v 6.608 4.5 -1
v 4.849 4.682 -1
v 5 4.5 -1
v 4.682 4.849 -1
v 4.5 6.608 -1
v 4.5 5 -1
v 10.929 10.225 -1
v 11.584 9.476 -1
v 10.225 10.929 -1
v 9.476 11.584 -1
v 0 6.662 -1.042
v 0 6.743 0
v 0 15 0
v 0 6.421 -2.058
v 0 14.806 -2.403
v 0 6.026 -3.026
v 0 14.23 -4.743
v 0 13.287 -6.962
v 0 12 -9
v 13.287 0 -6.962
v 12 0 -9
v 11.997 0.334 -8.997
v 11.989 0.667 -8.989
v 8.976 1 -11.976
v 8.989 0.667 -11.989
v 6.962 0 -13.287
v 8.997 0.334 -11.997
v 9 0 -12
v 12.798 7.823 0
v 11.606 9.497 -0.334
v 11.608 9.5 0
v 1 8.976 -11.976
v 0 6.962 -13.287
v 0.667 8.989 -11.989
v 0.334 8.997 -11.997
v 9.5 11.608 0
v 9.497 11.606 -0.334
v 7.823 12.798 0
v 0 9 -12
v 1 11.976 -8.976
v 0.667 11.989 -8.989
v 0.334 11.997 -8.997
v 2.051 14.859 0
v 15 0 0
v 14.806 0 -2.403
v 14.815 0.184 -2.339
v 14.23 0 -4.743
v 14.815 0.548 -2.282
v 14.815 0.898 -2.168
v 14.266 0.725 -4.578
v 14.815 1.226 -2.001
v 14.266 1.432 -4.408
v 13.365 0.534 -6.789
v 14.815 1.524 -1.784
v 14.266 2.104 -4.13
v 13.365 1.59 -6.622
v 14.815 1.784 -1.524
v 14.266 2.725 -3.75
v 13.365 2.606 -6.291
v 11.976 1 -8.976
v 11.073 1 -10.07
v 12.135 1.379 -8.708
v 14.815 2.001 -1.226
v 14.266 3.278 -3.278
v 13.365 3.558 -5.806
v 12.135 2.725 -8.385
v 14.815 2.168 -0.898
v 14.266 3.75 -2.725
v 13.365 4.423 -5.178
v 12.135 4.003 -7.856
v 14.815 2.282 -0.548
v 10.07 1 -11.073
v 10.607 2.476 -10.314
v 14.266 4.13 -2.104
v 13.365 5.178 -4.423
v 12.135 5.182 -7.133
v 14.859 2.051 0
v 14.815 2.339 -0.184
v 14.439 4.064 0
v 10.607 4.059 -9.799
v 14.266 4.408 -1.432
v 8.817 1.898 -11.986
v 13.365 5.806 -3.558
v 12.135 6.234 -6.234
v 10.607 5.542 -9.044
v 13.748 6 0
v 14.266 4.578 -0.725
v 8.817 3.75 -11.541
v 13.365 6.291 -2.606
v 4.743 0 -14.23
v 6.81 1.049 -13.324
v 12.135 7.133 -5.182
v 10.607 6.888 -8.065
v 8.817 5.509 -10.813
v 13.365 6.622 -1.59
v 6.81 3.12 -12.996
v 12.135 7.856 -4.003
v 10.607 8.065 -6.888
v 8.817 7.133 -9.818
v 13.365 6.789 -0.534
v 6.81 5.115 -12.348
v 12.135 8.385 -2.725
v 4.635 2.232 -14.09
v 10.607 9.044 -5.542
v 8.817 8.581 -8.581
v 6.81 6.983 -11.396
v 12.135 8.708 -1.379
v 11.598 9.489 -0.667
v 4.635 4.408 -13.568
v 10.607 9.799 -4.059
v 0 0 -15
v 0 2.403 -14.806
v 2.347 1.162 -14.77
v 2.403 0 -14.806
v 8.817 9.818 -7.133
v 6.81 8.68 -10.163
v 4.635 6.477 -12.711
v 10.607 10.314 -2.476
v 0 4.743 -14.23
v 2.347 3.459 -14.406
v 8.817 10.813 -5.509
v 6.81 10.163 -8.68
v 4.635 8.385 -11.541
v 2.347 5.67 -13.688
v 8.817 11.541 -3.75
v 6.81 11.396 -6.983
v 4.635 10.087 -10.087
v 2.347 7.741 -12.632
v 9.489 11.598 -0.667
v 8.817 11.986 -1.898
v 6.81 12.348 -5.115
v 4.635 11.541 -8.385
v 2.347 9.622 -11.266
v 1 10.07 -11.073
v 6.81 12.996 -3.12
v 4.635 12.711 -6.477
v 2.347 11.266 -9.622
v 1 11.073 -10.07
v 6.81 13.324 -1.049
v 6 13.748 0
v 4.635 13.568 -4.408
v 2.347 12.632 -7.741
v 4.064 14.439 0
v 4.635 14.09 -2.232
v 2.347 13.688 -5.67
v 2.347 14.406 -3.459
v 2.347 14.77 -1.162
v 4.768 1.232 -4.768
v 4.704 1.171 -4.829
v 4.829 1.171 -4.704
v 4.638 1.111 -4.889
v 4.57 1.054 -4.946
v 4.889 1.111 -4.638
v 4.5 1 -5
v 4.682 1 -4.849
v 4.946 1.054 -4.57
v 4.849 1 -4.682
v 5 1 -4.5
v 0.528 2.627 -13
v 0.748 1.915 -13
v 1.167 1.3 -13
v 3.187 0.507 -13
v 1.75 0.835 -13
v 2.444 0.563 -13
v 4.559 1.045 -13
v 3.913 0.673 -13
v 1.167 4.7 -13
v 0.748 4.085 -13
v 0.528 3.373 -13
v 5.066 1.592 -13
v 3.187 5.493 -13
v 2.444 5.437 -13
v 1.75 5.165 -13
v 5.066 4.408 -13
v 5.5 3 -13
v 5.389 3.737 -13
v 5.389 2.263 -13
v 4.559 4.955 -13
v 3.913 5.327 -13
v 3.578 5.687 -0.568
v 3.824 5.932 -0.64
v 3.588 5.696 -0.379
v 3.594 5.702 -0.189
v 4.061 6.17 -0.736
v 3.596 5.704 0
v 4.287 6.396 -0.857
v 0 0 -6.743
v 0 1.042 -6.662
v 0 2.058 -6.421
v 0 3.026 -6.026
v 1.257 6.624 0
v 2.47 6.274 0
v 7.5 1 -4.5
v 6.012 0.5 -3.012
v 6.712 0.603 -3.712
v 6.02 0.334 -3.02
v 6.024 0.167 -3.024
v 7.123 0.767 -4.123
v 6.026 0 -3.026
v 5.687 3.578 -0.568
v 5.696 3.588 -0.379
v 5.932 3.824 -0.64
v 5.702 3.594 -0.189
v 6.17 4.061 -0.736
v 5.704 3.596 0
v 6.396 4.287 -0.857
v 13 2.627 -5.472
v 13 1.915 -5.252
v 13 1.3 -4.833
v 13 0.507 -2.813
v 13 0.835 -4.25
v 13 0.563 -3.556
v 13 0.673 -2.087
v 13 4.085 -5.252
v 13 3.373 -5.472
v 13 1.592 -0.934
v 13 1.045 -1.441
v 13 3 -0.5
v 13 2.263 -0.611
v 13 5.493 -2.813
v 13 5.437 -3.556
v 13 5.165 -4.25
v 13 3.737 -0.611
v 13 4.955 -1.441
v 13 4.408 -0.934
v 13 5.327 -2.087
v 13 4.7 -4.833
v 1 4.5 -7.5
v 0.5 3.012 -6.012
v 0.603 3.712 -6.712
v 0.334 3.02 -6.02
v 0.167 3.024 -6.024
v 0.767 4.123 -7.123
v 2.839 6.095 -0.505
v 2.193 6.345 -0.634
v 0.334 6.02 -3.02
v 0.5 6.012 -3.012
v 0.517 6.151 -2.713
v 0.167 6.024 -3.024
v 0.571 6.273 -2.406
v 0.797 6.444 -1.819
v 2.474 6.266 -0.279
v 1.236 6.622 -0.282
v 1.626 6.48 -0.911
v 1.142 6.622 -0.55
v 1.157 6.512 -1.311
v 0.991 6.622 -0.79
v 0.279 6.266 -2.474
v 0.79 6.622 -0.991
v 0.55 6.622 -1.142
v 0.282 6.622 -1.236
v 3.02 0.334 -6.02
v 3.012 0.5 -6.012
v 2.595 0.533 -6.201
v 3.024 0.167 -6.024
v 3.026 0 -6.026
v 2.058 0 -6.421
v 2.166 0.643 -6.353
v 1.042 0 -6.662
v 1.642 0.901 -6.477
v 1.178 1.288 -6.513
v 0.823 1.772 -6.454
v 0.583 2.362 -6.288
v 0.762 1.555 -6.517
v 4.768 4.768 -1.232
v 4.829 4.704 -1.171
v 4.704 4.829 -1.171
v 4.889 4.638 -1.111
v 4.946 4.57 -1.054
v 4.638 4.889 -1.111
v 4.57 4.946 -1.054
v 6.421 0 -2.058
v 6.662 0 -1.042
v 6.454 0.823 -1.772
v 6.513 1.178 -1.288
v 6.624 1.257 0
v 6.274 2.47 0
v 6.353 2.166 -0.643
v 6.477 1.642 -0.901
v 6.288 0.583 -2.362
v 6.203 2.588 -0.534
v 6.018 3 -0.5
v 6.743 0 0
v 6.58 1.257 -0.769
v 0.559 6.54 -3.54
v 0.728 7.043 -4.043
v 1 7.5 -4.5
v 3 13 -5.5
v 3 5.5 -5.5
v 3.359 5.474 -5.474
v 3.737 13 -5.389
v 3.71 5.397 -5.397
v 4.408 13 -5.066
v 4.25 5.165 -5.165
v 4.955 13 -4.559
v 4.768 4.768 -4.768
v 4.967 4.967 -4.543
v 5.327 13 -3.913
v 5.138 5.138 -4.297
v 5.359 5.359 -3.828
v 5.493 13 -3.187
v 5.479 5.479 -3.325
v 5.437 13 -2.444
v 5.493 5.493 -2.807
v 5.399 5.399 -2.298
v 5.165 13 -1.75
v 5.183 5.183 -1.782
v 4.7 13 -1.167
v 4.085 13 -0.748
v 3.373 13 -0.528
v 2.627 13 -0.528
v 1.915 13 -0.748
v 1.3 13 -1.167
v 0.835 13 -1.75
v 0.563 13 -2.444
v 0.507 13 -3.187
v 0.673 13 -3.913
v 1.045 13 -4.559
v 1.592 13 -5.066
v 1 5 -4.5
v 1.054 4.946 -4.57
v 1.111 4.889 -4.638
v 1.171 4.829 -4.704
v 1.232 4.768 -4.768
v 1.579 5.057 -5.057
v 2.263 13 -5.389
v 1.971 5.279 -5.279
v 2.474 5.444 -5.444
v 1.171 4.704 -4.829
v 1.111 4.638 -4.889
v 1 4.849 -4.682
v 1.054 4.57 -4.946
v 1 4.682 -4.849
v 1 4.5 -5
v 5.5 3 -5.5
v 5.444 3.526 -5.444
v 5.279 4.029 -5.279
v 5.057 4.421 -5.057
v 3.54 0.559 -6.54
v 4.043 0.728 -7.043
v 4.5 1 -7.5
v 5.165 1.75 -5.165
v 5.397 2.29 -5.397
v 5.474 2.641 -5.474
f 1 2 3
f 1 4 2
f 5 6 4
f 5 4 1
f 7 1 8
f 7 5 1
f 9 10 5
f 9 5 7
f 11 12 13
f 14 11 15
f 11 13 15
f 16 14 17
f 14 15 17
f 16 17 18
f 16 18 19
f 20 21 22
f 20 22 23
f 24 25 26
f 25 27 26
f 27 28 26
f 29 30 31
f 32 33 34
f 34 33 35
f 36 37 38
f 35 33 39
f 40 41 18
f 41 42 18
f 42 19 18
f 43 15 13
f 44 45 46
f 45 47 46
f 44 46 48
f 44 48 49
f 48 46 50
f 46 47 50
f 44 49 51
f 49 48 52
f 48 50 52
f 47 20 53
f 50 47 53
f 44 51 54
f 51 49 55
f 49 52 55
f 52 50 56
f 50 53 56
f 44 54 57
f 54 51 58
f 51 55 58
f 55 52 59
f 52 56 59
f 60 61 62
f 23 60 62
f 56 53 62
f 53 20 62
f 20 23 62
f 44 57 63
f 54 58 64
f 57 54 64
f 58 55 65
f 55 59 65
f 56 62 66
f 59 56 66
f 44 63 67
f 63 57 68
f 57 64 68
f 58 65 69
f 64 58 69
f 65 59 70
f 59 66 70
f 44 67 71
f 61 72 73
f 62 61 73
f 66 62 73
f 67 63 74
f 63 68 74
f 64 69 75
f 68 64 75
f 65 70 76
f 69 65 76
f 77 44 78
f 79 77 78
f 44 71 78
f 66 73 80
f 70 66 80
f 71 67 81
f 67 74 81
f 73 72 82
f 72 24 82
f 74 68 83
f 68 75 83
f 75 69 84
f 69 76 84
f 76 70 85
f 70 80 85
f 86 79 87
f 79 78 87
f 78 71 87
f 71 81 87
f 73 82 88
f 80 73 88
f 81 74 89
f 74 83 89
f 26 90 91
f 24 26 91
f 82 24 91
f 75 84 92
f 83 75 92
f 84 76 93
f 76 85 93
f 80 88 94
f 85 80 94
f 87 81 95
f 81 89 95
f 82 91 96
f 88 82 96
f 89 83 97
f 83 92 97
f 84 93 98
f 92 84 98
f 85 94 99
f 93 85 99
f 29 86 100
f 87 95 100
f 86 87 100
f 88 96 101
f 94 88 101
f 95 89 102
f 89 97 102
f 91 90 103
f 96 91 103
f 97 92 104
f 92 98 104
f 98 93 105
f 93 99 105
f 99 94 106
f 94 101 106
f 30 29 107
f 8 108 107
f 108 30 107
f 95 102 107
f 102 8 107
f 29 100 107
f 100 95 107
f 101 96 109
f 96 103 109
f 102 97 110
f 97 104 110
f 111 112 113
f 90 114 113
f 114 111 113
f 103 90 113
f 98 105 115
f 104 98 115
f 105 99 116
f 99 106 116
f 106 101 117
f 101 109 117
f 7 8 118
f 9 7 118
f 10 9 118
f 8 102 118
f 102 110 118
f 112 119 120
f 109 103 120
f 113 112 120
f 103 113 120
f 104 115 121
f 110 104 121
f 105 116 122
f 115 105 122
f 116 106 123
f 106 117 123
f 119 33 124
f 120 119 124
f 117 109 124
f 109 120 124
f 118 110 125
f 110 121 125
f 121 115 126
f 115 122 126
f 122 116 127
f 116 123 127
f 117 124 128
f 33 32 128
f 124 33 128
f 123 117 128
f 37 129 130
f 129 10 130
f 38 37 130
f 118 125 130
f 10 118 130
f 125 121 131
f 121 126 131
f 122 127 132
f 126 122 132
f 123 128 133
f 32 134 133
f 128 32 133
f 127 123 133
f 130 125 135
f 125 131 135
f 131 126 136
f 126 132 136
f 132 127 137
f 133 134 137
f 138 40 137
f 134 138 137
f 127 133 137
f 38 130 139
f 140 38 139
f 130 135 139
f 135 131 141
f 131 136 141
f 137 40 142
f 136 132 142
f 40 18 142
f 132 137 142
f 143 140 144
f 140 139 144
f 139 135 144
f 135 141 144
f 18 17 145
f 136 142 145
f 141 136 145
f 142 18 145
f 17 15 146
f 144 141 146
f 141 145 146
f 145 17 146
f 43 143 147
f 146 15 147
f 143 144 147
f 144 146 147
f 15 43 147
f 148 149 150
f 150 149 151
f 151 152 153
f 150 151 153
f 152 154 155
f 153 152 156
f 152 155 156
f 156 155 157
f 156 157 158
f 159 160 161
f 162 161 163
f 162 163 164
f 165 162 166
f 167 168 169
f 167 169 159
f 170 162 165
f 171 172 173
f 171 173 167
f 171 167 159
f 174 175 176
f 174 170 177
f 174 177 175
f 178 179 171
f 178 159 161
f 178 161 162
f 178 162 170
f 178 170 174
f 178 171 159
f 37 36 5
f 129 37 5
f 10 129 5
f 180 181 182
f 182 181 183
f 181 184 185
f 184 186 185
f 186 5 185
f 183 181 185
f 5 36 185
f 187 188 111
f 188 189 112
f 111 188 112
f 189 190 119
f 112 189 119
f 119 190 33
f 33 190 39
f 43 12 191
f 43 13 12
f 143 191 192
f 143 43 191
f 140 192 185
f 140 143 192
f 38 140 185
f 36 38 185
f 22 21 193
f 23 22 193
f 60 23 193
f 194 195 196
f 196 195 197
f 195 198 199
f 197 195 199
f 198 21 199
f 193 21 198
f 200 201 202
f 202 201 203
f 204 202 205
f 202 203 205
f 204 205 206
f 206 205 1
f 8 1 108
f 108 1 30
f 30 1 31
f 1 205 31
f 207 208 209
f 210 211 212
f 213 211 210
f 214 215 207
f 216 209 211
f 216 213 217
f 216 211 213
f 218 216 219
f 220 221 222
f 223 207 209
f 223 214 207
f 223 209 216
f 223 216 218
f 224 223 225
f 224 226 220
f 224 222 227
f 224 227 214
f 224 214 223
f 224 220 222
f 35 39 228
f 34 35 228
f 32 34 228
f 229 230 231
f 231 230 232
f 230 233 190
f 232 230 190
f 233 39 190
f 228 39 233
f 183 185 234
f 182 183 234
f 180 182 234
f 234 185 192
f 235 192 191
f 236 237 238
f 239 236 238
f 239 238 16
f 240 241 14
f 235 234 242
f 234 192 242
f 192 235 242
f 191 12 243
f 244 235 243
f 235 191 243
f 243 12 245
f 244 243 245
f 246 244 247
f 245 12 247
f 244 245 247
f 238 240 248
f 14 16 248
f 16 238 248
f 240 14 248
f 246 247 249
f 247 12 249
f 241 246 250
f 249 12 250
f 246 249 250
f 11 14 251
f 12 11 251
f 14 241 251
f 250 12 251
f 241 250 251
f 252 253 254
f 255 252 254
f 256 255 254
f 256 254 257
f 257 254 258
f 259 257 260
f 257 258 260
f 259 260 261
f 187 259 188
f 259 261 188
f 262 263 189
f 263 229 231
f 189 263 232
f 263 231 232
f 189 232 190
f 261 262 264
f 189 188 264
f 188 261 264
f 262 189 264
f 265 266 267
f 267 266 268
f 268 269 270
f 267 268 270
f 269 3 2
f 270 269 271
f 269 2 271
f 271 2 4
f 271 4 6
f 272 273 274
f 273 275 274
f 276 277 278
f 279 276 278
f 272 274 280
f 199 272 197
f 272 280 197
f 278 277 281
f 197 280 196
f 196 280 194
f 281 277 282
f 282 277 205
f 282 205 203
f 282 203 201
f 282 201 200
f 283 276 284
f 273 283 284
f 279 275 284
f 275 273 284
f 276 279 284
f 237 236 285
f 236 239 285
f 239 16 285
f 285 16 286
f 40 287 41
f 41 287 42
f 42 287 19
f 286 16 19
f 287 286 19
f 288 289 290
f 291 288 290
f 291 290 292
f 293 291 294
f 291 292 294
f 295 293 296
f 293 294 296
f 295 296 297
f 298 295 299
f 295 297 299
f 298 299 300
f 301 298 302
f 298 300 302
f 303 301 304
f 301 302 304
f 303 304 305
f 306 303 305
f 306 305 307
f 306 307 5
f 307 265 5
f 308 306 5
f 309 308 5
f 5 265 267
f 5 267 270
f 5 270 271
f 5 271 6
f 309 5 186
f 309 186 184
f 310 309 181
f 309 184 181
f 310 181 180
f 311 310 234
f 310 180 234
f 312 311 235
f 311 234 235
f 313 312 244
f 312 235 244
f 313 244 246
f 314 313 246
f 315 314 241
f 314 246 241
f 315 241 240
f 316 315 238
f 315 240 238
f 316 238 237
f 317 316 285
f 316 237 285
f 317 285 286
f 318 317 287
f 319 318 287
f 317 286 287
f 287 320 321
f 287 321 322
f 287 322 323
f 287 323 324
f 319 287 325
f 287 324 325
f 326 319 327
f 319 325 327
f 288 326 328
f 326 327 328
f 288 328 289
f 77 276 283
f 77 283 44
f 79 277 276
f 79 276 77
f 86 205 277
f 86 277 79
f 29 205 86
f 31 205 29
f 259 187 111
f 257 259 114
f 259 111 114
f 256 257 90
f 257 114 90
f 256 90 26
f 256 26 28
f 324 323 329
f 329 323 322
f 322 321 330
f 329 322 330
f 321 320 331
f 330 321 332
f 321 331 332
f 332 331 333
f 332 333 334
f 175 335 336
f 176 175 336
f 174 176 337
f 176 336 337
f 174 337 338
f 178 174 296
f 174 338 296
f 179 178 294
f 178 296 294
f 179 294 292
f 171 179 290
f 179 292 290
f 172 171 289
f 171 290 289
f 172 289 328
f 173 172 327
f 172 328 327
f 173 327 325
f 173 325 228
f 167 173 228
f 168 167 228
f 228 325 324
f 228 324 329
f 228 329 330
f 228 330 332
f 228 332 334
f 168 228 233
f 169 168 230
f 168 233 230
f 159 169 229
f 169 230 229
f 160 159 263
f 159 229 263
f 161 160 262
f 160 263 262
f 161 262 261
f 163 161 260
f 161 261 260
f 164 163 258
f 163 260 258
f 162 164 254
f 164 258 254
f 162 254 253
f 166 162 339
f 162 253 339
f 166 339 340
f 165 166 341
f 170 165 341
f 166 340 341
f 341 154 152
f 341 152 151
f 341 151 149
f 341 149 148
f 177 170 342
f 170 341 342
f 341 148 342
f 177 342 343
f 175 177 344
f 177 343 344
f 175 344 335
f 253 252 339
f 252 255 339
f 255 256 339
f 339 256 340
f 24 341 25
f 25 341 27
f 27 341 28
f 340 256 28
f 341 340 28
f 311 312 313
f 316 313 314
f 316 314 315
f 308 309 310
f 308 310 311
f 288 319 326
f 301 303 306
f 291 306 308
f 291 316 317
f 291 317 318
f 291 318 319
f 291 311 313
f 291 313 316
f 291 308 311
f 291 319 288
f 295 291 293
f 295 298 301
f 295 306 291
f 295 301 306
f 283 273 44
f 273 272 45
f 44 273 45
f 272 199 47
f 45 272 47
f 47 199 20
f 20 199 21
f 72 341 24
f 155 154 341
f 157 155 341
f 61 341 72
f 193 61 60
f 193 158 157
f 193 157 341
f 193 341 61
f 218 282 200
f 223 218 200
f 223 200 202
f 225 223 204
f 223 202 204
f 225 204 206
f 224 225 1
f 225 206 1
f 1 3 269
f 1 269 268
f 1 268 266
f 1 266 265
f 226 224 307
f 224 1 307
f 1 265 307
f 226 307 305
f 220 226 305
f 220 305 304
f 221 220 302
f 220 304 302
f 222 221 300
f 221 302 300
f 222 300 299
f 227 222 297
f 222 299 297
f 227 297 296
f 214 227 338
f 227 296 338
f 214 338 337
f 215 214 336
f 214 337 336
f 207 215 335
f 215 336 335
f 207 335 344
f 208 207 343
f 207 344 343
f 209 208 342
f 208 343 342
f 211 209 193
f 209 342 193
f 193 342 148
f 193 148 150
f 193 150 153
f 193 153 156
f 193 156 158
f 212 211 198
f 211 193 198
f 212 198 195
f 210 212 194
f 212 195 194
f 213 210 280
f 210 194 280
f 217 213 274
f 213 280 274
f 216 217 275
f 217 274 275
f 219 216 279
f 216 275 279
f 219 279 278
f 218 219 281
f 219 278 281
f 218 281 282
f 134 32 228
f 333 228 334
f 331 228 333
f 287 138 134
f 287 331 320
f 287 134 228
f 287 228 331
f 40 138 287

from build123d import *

# Parameters (mm, degrees)
REVOLVE1_ANGLE      = 90.0000000000002
SKETCH5_R           = 2.5000000000000013
CUT_EXTRUDE3_DEPTH  = 13.000000000000002
SKETCH6_R           = 2.5000000000000004
CUT_EXTRUDE4_DEPTH  = 13.000000000000002
SKETCH7_R           = 2.5000000000000013
CUT_EXTRUDE5_DEPTH  = 13.000000000000002
CUT_REVOLVE14_ANGLE = 90.0000000000002
CUT_EXTRUDE20_DEPTH = 0.9999999999999974
CUT_EXTRUDE24_DEPTH = 1
CUT_EXTRUDE25_DEPTH = 1


with BuildPart() as part:
    # Sketch4 → Revolve1 (revolve)
    with BuildSketch(Plane(origin=(0, 0, 0), x_dir=(1, 0, 0), z_dir=(0, 1, 0))):
        with BuildLine():
            Line((0, 0), (15, 0))
            ThreePointArc((15, 0), (10.606601717798213, 10.606601717798211), (0, 15))
            Line((0, 15), (0, 0))
        make_face()
    revolve(axis=Axis((0, 0, 0), (1, 0, 0)), revolution_arc=REVOLVE1_ANGLE)

    # Sketch5 → Cut-Extrude3 (cut)
    with BuildSketch(Plane.XY):
        with Locations((3, 3)):
            Circle(SKETCH5_R)
    extrude(amount=-CUT_EXTRUDE3_DEPTH, mode=Mode.SUBTRACT)

    # Sketch6 → Cut-Extrude4 (cut)
    with BuildSketch(Plane.ZY):
        with Locations((-3, 3)):
            Circle(SKETCH6_R)
    extrude(amount=-CUT_EXTRUDE4_DEPTH, mode=Mode.SUBTRACT)

    # Sketch7 → Cut-Extrude5 (cut)
    with BuildSketch(Plane.XZ):
        with Locations(Location((3, -3, 0), (0, 0, 270))):
            Circle(SKETCH7_R)
    extrude(amount=-CUT_EXTRUDE5_DEPTH, mode=Mode.SUBTRACT)

    # Sketch8 → Cut-Revolve14 (revolve, cut)
    with BuildSketch(Plane.XY):
        with BuildLine():
            ThreePointArc((4.767766952966368, 4.767766952966372), (2.580296881351315, 6.229387725907349), (0, 6.742640687119288))
            Line((0, 6.742640687119287), (0, 0))
            Line((0, 0), (6.742640687119288, 4.1e-16))
            ThreePointArc((6.742640687119288, 1.52e-15), (6.229387725907348, 2.5802968813513187), (4.767766952966368, 4.767766952966372))
        make_face()
        with BuildLine():
            ThreePointArc((5.500000000000002, 2.9999999999999996), (0.6903011687217822, 2.043291419087274), (4.767766952966367, 4.767766952966372))
            ThreePointArc((4.767766952966367, 4.767766952966372), (5.309698831278217, 3.9567085809127267), (5.500000000000002, 3))
        make_face(mode=Mode.SUBTRACT)
    revolve(axis=Axis((0, 0, 0), (0, 1, 3.49e-15)), revolution_arc=CUT_REVOLVE14_ANGLE, mode=Mode.SUBTRACT)

    # Sketch9 → Cut-Extrude20 (cut)
    with BuildSketch(Plane.XY):
        with BuildLine():
            ThreePointArc((11.6081867662439, 9.499999999999998), (10.606601717798215, 10.60660171779821), (9.500000000000005, 11.608186766243897))
            Line((9.500000000000005, 11.608186766243898), (11.608186766243902, 9.499999999999998))
        make_face()
        with BuildLine():
            Line((11.608186766243902, 9.499999999999998), (9.500000000000005, 11.608186766243898))
            Line((9.500000000000005, 11.608186766243898), (3.5956903599630037, 5.703877126206902))
            ThreePointArc((3.5956903599630796, 5.703877126206793), (4.207841503717712, 5.268517183723248), (4.767766952966372, 4.7677669529663715))
            ThreePointArc((4.767766952966372, 4.7677669529663715), (5.268517183723248, 4.207841503717712), (5.703877126206793, 3.5956903599630796))
            Line((5.703877126206905, 3.5956903599630046), (11.608186766243902, 9.499999999999998))
        make_face()
        with BuildLine():
            ThreePointArc((4.767766952966372, 4.7677669529663715), (4.207841503717712, 5.268517183723248), (3.5956903599630796, 5.703877126206793))
            Line((3.5956903599630037, 5.703877126206902), (-1.0540933831219501, 1.0540933831219519))
            Line((-1.0540933831219503, 1.054093383121952), (1.0540933831219486, -1.0540933831219486))
            Line((1.0540933831219483, -1.0540933831219483), (5.703877126206905, 3.5956903599630046))
            ThreePointArc((5.703877126206793, 3.5956903599630796), (5.268517183723248, 4.207841503717712), (4.767766952966372, 4.7677669529663715))
        make_face()
    extrude(amount=-CUT_EXTRUDE20_DEPTH, mode=Mode.SUBTRACT)

    # Sketch10 → Cut-Extrude24 (cut)
    with BuildSketch(Plane.ZY):
        with BuildLine():
            Line((-8.999999999999977, 11.999999999999961), (-11.999999999999998, 9.000000000000002))
            Line((-11.999999999999998, 9.000000000000002), (-6.025660362620837, 3.025660362620844))
            ThreePointArc((-6.025660362621033, 3.0256603626207323), (-5.466557614006139, 3.947144700710623), (-4.76776695296637, 4.767766952966371))
            ThreePointArc((-4.767766952966371, 4.767766952966371), (-3.947144700710626, 5.466557614006138), (-3.0256603626207372, 6.025660362621032))
            Line((-3.02566036262085, 6.025660362620837), (-8.999999999999977, 11.999999999999961))
        make_face()
        with BuildLine():
            ThreePointArc((-9.000000000000004, 11.999999999999996), (-10.606601717798211, 10.606601717798213), (-12, 9))
            Line((-11.999999999999998, 9.000000000000002), (-8.999999999999977, 11.999999999999961))
        make_face()
        with BuildLine():
            ThreePointArc((-4.76776695296637, 4.767766952966371), (-5.466557614006139, 3.947144700710623), (-6.025660362621033, 3.0256603626207323))
            Line((-6.025660362620837, 3.025660362620844), (-1.4999999999999947, -1.4999999999999947))
            Line((-1.4999999999999944, -1.4999999999999944), (1.499999999999994, 1.4999999999999944))
            Line((1.4999999999999947, 1.4999999999999947), (-3.02566036262085, 6.025660362620837))
            ThreePointArc((-3.0256603626207372, 6.025660362621032), (-3.947144700710626, 5.466557614006138), (-4.767766952966371, 4.767766952966371))
        make_face()
    extrude(amount=-CUT_EXTRUDE24_DEPTH, mode=Mode.SUBTRACT)

    # Sketch11 → Cut-Extrude25 (cut)
    with BuildSketch(Plane.XZ):
        with BuildLine():
            Line((11.999999999999996, -9.000000000000002), (9.000000000000002, -11.999999999999998))
            ThreePointArc((8.999999999999996, -12.000000000000002), (10.60660171779821, -10.606601717798215), (11.999999999999998, -9.000000000000002))
        make_face()
        with BuildLine():
            Line((3.0256603626208403, -6.025660362620841), (9.000000000000002, -11.999999999999998))
            Line((9.000000000000002, -11.999999999999998), (11.999999999999996, -9.000000000000002))
            Line((11.999999999999996, -9.000000000000002), (6.02566036262084, -3.0256603626208403))
            ThreePointArc((6.025660362621034, -3.025660362620727), (5.466557614006142, -3.9471447007106204), (4.767766952966371, -4.767766952966369))
            ThreePointArc((4.7677669529663715, -4.767766952966372), (3.9471447007106226, -5.466557614006144), (3.0256603626207275, -6.025660362621036))
        make_face()
        with BuildLine():
            Line((-1.5000000000000036, -1.5), (3.0256603626208403, -6.025660362620841))
            ThreePointArc((3.0256603626207275, -6.025660362621036), (3.9471447007106226, -5.466557614006144), (4.7677669529663715, -4.767766952966372))
            ThreePointArc((4.767766952966371, -4.767766952966369), (5.466557614006142, -3.9471447007106204), (6.025660362621034, -3.025660362620727))
            Line((6.02566036262084, -3.0256603626208403), (1.5, 1.5000000000000036))
            Line((1.4999999999999996, 1.5000000000000036), (-1.500000000000003, -1.4999999999999996))
        make_face()
    extrude(amount=-CUT_EXTRUDE25_DEPTH, mode=Mode.SUBTRACT)


solid = part.part
